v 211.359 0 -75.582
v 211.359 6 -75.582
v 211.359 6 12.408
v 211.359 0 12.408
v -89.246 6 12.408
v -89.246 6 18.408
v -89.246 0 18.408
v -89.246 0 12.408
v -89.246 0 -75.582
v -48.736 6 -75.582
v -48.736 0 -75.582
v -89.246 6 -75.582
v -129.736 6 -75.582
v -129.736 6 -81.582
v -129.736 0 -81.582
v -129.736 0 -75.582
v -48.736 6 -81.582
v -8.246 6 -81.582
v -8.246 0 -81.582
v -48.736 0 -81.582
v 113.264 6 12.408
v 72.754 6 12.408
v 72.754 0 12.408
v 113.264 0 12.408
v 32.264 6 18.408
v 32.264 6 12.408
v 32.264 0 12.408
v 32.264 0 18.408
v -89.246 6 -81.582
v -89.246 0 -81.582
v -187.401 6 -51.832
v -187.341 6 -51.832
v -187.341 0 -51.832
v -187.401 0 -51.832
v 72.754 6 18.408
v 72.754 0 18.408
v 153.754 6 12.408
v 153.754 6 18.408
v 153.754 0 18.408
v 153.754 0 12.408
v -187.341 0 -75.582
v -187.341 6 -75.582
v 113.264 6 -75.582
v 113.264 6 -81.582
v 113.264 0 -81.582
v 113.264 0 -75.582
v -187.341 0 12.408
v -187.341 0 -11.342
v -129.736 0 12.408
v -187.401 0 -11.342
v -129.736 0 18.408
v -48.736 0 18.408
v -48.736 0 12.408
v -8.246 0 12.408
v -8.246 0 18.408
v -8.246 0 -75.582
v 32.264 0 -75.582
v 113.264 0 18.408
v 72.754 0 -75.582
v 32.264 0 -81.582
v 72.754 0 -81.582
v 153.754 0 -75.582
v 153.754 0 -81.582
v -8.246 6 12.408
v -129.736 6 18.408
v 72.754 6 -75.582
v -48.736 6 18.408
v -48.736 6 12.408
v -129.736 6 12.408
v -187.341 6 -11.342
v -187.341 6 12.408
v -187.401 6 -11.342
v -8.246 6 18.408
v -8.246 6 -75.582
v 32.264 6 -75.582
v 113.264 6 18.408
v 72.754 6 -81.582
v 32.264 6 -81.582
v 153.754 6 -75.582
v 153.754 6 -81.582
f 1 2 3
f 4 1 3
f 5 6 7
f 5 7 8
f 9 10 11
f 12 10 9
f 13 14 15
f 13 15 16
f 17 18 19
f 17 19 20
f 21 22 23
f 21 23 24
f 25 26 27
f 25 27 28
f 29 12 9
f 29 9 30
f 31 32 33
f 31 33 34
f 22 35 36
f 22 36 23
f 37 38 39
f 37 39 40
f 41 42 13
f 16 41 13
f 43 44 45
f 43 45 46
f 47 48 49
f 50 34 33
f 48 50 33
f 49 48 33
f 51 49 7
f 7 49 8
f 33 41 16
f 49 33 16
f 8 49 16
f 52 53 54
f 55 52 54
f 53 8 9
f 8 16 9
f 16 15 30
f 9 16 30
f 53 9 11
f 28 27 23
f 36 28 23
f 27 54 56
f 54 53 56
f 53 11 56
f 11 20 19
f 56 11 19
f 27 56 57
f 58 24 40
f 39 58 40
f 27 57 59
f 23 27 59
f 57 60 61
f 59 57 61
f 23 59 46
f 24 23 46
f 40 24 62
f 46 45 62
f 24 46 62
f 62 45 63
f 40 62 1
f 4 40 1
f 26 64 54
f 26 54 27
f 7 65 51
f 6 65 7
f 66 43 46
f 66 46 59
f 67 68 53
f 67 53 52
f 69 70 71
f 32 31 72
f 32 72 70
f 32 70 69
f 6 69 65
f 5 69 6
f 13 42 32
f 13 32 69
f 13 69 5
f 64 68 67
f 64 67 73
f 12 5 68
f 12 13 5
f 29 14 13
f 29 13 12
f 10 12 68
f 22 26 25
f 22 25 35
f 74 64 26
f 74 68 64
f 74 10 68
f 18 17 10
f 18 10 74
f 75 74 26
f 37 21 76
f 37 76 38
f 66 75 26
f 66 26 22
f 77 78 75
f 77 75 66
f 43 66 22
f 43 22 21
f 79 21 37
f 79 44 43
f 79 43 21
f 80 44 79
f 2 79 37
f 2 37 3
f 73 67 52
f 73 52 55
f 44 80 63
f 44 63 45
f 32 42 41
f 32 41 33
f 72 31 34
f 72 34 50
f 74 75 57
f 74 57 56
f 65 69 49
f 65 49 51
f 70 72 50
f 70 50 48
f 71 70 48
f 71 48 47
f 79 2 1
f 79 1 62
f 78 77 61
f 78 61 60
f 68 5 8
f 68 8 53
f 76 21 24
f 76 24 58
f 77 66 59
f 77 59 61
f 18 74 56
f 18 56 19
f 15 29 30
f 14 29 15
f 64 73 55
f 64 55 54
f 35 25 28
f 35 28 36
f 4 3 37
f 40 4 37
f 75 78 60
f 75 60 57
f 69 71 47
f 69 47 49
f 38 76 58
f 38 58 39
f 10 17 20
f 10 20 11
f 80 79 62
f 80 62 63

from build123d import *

# Parameters (mm, degrees)
SKETCH1_W               = 525.399648274
SKETCH1_H               = 377.876053004
BOSS_EXTRUDE1_DEPTH     = 6
CUT_EXTRUDE_THIN2_DEPTH = 324.642975299


with BuildPart() as part:
    # Sketch1 → Boss-Extrude1 (new body)
    with BuildSketch(Plane(origin=(0, 0, 0), x_dir=(1, 0, 0), z_dir=(0, 1, 0))):
        Rectangle(SKETCH1_W, SKETCH1_H)
    extrude(amount=BOSS_EXTRUDE1_DEPTH)

    # Sketch2 → Cut-Extrude-Thin2 (cut, through all)
    with BuildSketch(Plane(origin=(0, 6, 0), x_dir=(1, 0, 0), z_dir=(0, 1, 0))):
        Polygon((-187.350784755, 75.591944913), (-187.350784755, 51.841944259), (-187.411415821, 51.841944259), (-187.411415821, 11.331943142), (-187.350784755, 11.331943142), (-187.350784755, -12.418057512), (-129.745802698, -12.418057512), (-129.745802698, -18.418057678), (-89.235801582, -18.418057678), (-89.235801582, -12.418057512), (-48.745800465, -12.418057512), (-48.745800465, -18.418057678), (-8.235799349, -18.418057678), (-8.235799349, -12.418057512), (32.254201767, -12.418057512), (32.254201767, -18.418057678), (72.764202884, -18.418057678), (72.764202884, -12.418057512), (113.254204, -12.418057512), (113.254204, -18.418057678), (153.764205117, -18.418057678), (153.764205117, -12.418057512), (194.259206233, -12.418057512), (211.369187173, -12.418057512), (211.369187173, 11.336943142), (211.369187173, 51.836944259), (211.369187173, 75.591944913), (153.764205117, 75.591944913), (153.764205117, 81.591945079), (113.254204, 81.591945079), (113.254204, 75.591944913), (72.764202884, 75.591944913), (72.764202884, 81.591945079), (32.254201767, 81.591945079), (32.254201767, 75.591944913), (-8.235799349, 75.591944913), (-8.235799349, 81.591945079), (-48.745800465, 81.591945079), (-48.745800465, 75.591944913), (-89.235801582, 75.591944913), (-89.235801582, 81.591945079), (-129.745802698, 81.591945079), (-129.745802698, 75.591944913), (-170.240803815, 75.591944913), align=None)
        Polygon((-187.340784755, 75.581944913), (-187.340784755, 51.831944259), (-187.401415821, 51.831944259), (-187.401415821, 11.341943142), (-187.340784755, 11.341943142), (-187.340784755, -12.408057512), (-129.735802698, -12.408057512), (-129.735802698, -18.408057678), (-89.245801582, -18.408057678), (-89.245801582, -12.408057512), (-48.735800465, -12.408057512), (-48.735800465, -18.408057678), (-8.245799349, -18.408057678), (-8.245799349, -12.408057512), (32.264201767, -12.408057512), (32.264201767, -18.408057678), (72.754202884, -18.408057678), (72.754202884, -12.408057512), (113.264204, -12.408057512), (113.264204, -18.408057678), (153.754205117, -18.408057678), (153.754205117, -12.408057512), (194.259206233, -12.408057512), (211.359187173, -12.408057512), (211.359187173, 11.336943142), (211.359187173, 51.836944259), (211.359187173, 75.581944913), (153.754205117, 75.581944913), (153.754205117, 81.581945079), (113.264204, 81.581945079), (113.264204, 75.581944913), (72.754202884, 75.581944913), (72.754202884, 81.581945079), (32.264201767, 81.581945079), (32.264201767, 75.581944913), (-8.245799349, 75.581944913), (-8.245799349, 81.581945079), (-48.735800465, 81.581945079), (-48.735800465, 75.581944913), (-89.245801582, 75.581944913), (-89.245801582, 81.581945079), (-129.735802698, 81.581945079), (-129.735802698, 75.581944913), (-170.240803815, 75.581944913), align=None, mode=Mode.SUBTRACT)
    extrude(amount=-CUT_EXTRUDE_THIN2_DEPTH, mode=Mode.SUBTRACT)


with BuildPart() as body_2:
    # of the pieces the cut leaves, the one that is kept (cut_extrude_thin2_keep)
    add(part.part.solids().sort_by_distance((-129.735802698, 0, -75.581944913))[0])


solid = body_2.part
